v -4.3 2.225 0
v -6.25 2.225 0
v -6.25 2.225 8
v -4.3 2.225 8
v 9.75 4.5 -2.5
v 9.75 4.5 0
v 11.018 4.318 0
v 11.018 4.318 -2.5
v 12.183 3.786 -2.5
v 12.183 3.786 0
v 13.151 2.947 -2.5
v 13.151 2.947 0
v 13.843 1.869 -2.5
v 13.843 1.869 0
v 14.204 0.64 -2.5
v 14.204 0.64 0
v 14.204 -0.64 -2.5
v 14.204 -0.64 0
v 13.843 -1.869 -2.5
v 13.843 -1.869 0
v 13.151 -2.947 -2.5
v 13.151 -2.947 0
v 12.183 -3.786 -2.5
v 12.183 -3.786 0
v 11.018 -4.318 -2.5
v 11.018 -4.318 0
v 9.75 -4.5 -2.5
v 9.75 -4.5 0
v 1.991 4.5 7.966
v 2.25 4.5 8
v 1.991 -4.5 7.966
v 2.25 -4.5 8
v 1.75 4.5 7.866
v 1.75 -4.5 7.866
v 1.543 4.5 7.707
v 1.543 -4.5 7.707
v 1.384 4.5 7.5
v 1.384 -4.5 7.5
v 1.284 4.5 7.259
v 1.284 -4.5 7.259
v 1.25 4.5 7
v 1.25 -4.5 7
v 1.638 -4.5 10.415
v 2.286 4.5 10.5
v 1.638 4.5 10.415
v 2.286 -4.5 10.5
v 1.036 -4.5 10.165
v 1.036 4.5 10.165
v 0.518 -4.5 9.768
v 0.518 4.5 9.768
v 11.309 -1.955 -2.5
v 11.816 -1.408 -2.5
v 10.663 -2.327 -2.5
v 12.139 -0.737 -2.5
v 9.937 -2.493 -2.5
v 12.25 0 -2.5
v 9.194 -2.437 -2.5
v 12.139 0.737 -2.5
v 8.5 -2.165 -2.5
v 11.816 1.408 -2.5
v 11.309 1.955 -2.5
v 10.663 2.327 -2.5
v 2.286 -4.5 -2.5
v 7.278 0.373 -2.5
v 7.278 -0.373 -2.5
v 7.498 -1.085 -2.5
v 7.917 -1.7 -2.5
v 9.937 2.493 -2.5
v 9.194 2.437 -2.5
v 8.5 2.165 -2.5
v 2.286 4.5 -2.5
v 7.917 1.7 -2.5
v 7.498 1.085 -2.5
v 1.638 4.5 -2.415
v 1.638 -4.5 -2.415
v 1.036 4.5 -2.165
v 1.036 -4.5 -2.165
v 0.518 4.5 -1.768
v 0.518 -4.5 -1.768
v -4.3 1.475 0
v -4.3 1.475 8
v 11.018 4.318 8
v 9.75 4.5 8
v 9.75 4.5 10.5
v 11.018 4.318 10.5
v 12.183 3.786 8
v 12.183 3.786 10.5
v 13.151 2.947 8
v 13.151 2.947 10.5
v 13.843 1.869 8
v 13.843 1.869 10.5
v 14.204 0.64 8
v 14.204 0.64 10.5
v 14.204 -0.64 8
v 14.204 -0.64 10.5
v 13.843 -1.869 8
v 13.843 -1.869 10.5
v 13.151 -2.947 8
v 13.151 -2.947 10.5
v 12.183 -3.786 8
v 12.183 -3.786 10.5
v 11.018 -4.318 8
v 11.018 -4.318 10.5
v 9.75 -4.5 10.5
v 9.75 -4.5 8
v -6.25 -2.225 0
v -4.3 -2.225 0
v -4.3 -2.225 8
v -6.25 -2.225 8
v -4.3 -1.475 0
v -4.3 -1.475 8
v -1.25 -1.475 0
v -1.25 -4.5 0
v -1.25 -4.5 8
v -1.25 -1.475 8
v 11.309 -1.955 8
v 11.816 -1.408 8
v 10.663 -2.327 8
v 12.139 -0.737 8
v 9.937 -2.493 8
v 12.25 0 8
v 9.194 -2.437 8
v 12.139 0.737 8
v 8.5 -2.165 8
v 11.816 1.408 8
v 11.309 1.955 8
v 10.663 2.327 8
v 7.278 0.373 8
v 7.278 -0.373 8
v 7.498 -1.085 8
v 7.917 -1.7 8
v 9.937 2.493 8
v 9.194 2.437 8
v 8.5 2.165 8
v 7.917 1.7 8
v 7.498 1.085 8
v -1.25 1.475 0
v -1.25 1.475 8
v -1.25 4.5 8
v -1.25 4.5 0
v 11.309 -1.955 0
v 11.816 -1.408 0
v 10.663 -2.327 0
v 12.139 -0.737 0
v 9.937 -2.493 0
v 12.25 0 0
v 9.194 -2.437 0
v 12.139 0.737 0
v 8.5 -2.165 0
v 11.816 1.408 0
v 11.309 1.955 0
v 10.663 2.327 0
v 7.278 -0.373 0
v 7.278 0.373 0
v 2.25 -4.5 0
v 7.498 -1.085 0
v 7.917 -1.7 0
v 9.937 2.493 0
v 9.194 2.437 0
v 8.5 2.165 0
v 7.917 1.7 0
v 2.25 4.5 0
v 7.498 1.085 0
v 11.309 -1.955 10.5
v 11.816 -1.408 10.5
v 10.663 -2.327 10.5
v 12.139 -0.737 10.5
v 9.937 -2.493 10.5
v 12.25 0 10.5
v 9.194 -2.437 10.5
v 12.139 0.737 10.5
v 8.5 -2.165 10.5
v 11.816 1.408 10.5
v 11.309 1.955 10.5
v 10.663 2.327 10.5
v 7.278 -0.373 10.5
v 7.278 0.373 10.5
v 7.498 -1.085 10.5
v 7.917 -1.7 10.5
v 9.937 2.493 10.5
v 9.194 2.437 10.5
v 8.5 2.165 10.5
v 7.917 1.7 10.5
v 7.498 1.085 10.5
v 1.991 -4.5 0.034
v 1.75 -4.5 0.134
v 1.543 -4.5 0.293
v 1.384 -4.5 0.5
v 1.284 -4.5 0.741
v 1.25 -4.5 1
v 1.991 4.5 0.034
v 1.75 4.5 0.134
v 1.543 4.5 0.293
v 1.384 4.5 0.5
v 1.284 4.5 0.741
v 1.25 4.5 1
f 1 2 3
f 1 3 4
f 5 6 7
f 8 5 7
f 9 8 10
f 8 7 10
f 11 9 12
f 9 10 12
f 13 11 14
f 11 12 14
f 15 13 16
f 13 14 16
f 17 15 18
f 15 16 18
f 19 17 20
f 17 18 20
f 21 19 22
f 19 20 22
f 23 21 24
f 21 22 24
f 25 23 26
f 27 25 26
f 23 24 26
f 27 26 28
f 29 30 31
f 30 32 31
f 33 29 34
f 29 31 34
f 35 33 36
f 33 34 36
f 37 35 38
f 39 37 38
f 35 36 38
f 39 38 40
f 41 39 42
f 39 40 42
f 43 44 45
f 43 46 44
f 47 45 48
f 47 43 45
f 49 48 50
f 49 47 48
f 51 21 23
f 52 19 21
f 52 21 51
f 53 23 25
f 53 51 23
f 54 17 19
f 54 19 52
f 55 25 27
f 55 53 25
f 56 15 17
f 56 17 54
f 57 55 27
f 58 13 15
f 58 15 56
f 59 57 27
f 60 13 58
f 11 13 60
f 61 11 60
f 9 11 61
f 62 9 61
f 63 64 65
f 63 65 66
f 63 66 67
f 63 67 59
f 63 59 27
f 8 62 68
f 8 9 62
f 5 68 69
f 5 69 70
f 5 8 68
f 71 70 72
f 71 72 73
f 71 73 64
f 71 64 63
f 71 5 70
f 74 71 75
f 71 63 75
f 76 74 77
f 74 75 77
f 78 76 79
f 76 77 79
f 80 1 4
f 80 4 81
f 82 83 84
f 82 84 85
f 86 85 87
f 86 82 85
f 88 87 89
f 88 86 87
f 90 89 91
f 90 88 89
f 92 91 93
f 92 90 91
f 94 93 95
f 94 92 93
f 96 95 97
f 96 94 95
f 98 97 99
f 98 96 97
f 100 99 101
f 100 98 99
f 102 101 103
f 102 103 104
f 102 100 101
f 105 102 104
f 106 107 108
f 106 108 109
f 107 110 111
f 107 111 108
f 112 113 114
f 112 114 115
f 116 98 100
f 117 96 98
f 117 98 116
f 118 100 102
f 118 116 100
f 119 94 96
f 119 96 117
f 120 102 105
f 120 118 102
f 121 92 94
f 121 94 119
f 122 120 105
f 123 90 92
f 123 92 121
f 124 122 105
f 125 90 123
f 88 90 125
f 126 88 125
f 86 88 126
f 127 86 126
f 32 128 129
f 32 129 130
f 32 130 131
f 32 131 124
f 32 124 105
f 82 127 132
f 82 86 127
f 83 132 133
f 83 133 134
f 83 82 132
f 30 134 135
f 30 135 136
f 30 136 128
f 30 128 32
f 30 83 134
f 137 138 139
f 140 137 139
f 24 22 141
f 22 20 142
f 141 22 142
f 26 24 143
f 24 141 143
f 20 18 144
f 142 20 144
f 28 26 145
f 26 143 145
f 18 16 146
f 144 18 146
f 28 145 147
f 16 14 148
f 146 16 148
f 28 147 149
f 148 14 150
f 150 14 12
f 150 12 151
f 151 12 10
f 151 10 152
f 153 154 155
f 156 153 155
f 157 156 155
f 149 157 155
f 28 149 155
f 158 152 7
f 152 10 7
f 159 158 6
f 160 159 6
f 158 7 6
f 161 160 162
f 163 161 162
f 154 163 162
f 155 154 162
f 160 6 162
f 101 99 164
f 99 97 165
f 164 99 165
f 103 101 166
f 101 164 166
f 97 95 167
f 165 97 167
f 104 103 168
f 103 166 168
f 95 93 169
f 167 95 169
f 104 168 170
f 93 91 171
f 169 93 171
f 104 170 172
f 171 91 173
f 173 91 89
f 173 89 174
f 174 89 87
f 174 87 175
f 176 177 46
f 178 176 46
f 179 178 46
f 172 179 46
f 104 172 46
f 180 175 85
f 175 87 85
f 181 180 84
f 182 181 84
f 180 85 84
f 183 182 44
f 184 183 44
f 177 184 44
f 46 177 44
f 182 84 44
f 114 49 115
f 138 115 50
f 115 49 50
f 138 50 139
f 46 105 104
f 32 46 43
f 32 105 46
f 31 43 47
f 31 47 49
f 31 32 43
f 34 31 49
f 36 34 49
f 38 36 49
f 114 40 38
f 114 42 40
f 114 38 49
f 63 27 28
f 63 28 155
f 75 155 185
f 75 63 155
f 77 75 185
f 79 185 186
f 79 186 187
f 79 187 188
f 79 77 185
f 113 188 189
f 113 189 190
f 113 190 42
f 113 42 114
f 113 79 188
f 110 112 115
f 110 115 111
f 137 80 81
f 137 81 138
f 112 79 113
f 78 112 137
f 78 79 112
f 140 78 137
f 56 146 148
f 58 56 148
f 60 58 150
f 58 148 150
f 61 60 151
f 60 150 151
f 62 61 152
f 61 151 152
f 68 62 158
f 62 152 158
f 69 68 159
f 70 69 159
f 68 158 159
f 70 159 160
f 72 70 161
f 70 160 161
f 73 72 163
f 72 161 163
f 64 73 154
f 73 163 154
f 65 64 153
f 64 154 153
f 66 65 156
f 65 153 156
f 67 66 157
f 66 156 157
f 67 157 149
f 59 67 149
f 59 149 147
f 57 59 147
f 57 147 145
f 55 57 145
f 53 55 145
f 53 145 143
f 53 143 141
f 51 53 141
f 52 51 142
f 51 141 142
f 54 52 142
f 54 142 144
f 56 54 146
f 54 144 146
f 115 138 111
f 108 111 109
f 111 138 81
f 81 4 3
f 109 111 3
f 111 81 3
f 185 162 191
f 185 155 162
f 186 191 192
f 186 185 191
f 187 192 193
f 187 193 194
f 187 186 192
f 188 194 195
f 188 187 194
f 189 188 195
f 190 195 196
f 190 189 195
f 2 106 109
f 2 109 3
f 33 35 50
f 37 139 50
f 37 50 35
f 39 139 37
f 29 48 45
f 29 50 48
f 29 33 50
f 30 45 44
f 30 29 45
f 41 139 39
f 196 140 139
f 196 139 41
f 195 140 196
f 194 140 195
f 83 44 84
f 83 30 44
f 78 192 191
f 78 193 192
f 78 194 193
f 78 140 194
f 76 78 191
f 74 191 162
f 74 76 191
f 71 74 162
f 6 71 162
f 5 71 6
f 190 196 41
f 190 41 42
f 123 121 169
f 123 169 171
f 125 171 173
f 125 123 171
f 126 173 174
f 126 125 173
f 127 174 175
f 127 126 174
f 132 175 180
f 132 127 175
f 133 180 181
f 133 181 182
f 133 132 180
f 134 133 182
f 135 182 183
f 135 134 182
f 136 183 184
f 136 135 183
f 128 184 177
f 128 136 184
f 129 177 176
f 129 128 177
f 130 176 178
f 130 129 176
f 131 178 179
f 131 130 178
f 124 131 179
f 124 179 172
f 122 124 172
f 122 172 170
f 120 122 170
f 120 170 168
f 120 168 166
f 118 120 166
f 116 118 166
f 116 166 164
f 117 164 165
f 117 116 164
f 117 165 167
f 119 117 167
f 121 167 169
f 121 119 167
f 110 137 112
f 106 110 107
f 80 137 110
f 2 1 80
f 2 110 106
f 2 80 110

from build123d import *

# Parameters (mm, degrees)
BOSS_EXTRUDE1_DEPTH  = 8
SKETCH2_R            = 2.5
BOSS_EXTRUDE3_DEPTH  = 2.5
CUT_EXTRUDE2_DEPTH   = 19.656433207
FILLET5_R            = 1
FILLET6_R            = 2.5
FILLET5_OF_MIRROR2_R = 1
FILLET6_OF_MIRROR2_R = 2.5


with BuildPart() as part:
    # Sketch1 → Boss-Extrude1 (new body)
    with BuildSketch(Plane.XY):
        Polygon((1.25, -4.5), (-1.25, -4.5), (-1.25, -1.475), (-4.3, -1.475), (-4.3, -2.225), (-6.25, -2.225), (-6.25, 2.225), (-4.3, 2.225), (-4.3, 1.475), (-1.25, 1.475), (-1.25, 4.5), (1.25, 4.5), align=None)
    extrude(amount=BOSS_EXTRUDE1_DEPTH)

    # Sketch2 → Boss-Extrude3 (add)
    with BuildSketch(Plane.XY):
        with BuildLine():
            Line((9.75, -4.5), (-1.25, -4.5))
            Line((-1.25, -4.5), (-1.25, 4.5))
            Line((-1.25, 4.5), (9.75, 4.5))
            ThreePointArc((9.75, 4.5), (14.25, 0), (9.75, -4.5))
        make_face()
        with Locations((9.75, 0)):
            Circle(SKETCH2_R, mode=Mode.SUBTRACT)
    boss_extrude3 = extrude(amount=-BOSS_EXTRUDE3_DEPTH)

    # Sketch5 → Cut-Extrude2 (cut, symmetric)
    with BuildSketch(Plane(origin=(0, 4.5, 0), x_dir=(1, 0, 0), z_dir=(0, 1, 0))):
        Polygon((-1.25, 2.5), (1.25, 2.5), (-1.25, 0), align=None)
    cut_extrude2 = extrude(amount=CUT_EXTRUDE2_DEPTH, both=True, mode=Mode.SUBTRACT)

    # Fillet5
    fillet5_edges = [part.edges().sort_by_distance(p)[0] for p in [
        (1.25, 0, 0),
    ]]
    fillet(fillet5_edges, radius=FILLET5_R)

    # Fillet6
    fillet6_edges = [part.edges().sort_by_distance(p)[0] for p in [
        (1.25, 0, -2.5),
    ]]
    fillet(fillet6_edges, radius=FILLET6_R)

    # Mirror2: Boss-Extrude3, Cut-Extrude2 across plane
    add(boss_extrude3.mirror(Plane(origin=(0, 0, 4), x_dir=(1, 0, 0), z_dir=(0, 0, -1))))
    add(cut_extrude2.mirror(Plane(origin=(0, 0, 4), x_dir=(1, 0, 0), z_dir=(0, 0, -1))), mode=Mode.SUBTRACT)

    # Fillet5 of Mirror2
    fillet5_of_mirror2_edges = [part.edges().sort_by_distance(p)[0] for p in [
        (1.25, 0, 8),
    ]]
    fillet(fillet5_of_mirror2_edges, radius=FILLET5_OF_MIRROR2_R)

    # Fillet6 of Mirror2
    fillet6_of_mirror2_edges = [part.edges().sort_by_distance(p)[0] for p in [
        (1.25, 0, 10.5),
    ]]
    fillet(fillet6_of_mirror2_edges, radius=FILLET6_OF_MIRROR2_R)


solid = part.part
